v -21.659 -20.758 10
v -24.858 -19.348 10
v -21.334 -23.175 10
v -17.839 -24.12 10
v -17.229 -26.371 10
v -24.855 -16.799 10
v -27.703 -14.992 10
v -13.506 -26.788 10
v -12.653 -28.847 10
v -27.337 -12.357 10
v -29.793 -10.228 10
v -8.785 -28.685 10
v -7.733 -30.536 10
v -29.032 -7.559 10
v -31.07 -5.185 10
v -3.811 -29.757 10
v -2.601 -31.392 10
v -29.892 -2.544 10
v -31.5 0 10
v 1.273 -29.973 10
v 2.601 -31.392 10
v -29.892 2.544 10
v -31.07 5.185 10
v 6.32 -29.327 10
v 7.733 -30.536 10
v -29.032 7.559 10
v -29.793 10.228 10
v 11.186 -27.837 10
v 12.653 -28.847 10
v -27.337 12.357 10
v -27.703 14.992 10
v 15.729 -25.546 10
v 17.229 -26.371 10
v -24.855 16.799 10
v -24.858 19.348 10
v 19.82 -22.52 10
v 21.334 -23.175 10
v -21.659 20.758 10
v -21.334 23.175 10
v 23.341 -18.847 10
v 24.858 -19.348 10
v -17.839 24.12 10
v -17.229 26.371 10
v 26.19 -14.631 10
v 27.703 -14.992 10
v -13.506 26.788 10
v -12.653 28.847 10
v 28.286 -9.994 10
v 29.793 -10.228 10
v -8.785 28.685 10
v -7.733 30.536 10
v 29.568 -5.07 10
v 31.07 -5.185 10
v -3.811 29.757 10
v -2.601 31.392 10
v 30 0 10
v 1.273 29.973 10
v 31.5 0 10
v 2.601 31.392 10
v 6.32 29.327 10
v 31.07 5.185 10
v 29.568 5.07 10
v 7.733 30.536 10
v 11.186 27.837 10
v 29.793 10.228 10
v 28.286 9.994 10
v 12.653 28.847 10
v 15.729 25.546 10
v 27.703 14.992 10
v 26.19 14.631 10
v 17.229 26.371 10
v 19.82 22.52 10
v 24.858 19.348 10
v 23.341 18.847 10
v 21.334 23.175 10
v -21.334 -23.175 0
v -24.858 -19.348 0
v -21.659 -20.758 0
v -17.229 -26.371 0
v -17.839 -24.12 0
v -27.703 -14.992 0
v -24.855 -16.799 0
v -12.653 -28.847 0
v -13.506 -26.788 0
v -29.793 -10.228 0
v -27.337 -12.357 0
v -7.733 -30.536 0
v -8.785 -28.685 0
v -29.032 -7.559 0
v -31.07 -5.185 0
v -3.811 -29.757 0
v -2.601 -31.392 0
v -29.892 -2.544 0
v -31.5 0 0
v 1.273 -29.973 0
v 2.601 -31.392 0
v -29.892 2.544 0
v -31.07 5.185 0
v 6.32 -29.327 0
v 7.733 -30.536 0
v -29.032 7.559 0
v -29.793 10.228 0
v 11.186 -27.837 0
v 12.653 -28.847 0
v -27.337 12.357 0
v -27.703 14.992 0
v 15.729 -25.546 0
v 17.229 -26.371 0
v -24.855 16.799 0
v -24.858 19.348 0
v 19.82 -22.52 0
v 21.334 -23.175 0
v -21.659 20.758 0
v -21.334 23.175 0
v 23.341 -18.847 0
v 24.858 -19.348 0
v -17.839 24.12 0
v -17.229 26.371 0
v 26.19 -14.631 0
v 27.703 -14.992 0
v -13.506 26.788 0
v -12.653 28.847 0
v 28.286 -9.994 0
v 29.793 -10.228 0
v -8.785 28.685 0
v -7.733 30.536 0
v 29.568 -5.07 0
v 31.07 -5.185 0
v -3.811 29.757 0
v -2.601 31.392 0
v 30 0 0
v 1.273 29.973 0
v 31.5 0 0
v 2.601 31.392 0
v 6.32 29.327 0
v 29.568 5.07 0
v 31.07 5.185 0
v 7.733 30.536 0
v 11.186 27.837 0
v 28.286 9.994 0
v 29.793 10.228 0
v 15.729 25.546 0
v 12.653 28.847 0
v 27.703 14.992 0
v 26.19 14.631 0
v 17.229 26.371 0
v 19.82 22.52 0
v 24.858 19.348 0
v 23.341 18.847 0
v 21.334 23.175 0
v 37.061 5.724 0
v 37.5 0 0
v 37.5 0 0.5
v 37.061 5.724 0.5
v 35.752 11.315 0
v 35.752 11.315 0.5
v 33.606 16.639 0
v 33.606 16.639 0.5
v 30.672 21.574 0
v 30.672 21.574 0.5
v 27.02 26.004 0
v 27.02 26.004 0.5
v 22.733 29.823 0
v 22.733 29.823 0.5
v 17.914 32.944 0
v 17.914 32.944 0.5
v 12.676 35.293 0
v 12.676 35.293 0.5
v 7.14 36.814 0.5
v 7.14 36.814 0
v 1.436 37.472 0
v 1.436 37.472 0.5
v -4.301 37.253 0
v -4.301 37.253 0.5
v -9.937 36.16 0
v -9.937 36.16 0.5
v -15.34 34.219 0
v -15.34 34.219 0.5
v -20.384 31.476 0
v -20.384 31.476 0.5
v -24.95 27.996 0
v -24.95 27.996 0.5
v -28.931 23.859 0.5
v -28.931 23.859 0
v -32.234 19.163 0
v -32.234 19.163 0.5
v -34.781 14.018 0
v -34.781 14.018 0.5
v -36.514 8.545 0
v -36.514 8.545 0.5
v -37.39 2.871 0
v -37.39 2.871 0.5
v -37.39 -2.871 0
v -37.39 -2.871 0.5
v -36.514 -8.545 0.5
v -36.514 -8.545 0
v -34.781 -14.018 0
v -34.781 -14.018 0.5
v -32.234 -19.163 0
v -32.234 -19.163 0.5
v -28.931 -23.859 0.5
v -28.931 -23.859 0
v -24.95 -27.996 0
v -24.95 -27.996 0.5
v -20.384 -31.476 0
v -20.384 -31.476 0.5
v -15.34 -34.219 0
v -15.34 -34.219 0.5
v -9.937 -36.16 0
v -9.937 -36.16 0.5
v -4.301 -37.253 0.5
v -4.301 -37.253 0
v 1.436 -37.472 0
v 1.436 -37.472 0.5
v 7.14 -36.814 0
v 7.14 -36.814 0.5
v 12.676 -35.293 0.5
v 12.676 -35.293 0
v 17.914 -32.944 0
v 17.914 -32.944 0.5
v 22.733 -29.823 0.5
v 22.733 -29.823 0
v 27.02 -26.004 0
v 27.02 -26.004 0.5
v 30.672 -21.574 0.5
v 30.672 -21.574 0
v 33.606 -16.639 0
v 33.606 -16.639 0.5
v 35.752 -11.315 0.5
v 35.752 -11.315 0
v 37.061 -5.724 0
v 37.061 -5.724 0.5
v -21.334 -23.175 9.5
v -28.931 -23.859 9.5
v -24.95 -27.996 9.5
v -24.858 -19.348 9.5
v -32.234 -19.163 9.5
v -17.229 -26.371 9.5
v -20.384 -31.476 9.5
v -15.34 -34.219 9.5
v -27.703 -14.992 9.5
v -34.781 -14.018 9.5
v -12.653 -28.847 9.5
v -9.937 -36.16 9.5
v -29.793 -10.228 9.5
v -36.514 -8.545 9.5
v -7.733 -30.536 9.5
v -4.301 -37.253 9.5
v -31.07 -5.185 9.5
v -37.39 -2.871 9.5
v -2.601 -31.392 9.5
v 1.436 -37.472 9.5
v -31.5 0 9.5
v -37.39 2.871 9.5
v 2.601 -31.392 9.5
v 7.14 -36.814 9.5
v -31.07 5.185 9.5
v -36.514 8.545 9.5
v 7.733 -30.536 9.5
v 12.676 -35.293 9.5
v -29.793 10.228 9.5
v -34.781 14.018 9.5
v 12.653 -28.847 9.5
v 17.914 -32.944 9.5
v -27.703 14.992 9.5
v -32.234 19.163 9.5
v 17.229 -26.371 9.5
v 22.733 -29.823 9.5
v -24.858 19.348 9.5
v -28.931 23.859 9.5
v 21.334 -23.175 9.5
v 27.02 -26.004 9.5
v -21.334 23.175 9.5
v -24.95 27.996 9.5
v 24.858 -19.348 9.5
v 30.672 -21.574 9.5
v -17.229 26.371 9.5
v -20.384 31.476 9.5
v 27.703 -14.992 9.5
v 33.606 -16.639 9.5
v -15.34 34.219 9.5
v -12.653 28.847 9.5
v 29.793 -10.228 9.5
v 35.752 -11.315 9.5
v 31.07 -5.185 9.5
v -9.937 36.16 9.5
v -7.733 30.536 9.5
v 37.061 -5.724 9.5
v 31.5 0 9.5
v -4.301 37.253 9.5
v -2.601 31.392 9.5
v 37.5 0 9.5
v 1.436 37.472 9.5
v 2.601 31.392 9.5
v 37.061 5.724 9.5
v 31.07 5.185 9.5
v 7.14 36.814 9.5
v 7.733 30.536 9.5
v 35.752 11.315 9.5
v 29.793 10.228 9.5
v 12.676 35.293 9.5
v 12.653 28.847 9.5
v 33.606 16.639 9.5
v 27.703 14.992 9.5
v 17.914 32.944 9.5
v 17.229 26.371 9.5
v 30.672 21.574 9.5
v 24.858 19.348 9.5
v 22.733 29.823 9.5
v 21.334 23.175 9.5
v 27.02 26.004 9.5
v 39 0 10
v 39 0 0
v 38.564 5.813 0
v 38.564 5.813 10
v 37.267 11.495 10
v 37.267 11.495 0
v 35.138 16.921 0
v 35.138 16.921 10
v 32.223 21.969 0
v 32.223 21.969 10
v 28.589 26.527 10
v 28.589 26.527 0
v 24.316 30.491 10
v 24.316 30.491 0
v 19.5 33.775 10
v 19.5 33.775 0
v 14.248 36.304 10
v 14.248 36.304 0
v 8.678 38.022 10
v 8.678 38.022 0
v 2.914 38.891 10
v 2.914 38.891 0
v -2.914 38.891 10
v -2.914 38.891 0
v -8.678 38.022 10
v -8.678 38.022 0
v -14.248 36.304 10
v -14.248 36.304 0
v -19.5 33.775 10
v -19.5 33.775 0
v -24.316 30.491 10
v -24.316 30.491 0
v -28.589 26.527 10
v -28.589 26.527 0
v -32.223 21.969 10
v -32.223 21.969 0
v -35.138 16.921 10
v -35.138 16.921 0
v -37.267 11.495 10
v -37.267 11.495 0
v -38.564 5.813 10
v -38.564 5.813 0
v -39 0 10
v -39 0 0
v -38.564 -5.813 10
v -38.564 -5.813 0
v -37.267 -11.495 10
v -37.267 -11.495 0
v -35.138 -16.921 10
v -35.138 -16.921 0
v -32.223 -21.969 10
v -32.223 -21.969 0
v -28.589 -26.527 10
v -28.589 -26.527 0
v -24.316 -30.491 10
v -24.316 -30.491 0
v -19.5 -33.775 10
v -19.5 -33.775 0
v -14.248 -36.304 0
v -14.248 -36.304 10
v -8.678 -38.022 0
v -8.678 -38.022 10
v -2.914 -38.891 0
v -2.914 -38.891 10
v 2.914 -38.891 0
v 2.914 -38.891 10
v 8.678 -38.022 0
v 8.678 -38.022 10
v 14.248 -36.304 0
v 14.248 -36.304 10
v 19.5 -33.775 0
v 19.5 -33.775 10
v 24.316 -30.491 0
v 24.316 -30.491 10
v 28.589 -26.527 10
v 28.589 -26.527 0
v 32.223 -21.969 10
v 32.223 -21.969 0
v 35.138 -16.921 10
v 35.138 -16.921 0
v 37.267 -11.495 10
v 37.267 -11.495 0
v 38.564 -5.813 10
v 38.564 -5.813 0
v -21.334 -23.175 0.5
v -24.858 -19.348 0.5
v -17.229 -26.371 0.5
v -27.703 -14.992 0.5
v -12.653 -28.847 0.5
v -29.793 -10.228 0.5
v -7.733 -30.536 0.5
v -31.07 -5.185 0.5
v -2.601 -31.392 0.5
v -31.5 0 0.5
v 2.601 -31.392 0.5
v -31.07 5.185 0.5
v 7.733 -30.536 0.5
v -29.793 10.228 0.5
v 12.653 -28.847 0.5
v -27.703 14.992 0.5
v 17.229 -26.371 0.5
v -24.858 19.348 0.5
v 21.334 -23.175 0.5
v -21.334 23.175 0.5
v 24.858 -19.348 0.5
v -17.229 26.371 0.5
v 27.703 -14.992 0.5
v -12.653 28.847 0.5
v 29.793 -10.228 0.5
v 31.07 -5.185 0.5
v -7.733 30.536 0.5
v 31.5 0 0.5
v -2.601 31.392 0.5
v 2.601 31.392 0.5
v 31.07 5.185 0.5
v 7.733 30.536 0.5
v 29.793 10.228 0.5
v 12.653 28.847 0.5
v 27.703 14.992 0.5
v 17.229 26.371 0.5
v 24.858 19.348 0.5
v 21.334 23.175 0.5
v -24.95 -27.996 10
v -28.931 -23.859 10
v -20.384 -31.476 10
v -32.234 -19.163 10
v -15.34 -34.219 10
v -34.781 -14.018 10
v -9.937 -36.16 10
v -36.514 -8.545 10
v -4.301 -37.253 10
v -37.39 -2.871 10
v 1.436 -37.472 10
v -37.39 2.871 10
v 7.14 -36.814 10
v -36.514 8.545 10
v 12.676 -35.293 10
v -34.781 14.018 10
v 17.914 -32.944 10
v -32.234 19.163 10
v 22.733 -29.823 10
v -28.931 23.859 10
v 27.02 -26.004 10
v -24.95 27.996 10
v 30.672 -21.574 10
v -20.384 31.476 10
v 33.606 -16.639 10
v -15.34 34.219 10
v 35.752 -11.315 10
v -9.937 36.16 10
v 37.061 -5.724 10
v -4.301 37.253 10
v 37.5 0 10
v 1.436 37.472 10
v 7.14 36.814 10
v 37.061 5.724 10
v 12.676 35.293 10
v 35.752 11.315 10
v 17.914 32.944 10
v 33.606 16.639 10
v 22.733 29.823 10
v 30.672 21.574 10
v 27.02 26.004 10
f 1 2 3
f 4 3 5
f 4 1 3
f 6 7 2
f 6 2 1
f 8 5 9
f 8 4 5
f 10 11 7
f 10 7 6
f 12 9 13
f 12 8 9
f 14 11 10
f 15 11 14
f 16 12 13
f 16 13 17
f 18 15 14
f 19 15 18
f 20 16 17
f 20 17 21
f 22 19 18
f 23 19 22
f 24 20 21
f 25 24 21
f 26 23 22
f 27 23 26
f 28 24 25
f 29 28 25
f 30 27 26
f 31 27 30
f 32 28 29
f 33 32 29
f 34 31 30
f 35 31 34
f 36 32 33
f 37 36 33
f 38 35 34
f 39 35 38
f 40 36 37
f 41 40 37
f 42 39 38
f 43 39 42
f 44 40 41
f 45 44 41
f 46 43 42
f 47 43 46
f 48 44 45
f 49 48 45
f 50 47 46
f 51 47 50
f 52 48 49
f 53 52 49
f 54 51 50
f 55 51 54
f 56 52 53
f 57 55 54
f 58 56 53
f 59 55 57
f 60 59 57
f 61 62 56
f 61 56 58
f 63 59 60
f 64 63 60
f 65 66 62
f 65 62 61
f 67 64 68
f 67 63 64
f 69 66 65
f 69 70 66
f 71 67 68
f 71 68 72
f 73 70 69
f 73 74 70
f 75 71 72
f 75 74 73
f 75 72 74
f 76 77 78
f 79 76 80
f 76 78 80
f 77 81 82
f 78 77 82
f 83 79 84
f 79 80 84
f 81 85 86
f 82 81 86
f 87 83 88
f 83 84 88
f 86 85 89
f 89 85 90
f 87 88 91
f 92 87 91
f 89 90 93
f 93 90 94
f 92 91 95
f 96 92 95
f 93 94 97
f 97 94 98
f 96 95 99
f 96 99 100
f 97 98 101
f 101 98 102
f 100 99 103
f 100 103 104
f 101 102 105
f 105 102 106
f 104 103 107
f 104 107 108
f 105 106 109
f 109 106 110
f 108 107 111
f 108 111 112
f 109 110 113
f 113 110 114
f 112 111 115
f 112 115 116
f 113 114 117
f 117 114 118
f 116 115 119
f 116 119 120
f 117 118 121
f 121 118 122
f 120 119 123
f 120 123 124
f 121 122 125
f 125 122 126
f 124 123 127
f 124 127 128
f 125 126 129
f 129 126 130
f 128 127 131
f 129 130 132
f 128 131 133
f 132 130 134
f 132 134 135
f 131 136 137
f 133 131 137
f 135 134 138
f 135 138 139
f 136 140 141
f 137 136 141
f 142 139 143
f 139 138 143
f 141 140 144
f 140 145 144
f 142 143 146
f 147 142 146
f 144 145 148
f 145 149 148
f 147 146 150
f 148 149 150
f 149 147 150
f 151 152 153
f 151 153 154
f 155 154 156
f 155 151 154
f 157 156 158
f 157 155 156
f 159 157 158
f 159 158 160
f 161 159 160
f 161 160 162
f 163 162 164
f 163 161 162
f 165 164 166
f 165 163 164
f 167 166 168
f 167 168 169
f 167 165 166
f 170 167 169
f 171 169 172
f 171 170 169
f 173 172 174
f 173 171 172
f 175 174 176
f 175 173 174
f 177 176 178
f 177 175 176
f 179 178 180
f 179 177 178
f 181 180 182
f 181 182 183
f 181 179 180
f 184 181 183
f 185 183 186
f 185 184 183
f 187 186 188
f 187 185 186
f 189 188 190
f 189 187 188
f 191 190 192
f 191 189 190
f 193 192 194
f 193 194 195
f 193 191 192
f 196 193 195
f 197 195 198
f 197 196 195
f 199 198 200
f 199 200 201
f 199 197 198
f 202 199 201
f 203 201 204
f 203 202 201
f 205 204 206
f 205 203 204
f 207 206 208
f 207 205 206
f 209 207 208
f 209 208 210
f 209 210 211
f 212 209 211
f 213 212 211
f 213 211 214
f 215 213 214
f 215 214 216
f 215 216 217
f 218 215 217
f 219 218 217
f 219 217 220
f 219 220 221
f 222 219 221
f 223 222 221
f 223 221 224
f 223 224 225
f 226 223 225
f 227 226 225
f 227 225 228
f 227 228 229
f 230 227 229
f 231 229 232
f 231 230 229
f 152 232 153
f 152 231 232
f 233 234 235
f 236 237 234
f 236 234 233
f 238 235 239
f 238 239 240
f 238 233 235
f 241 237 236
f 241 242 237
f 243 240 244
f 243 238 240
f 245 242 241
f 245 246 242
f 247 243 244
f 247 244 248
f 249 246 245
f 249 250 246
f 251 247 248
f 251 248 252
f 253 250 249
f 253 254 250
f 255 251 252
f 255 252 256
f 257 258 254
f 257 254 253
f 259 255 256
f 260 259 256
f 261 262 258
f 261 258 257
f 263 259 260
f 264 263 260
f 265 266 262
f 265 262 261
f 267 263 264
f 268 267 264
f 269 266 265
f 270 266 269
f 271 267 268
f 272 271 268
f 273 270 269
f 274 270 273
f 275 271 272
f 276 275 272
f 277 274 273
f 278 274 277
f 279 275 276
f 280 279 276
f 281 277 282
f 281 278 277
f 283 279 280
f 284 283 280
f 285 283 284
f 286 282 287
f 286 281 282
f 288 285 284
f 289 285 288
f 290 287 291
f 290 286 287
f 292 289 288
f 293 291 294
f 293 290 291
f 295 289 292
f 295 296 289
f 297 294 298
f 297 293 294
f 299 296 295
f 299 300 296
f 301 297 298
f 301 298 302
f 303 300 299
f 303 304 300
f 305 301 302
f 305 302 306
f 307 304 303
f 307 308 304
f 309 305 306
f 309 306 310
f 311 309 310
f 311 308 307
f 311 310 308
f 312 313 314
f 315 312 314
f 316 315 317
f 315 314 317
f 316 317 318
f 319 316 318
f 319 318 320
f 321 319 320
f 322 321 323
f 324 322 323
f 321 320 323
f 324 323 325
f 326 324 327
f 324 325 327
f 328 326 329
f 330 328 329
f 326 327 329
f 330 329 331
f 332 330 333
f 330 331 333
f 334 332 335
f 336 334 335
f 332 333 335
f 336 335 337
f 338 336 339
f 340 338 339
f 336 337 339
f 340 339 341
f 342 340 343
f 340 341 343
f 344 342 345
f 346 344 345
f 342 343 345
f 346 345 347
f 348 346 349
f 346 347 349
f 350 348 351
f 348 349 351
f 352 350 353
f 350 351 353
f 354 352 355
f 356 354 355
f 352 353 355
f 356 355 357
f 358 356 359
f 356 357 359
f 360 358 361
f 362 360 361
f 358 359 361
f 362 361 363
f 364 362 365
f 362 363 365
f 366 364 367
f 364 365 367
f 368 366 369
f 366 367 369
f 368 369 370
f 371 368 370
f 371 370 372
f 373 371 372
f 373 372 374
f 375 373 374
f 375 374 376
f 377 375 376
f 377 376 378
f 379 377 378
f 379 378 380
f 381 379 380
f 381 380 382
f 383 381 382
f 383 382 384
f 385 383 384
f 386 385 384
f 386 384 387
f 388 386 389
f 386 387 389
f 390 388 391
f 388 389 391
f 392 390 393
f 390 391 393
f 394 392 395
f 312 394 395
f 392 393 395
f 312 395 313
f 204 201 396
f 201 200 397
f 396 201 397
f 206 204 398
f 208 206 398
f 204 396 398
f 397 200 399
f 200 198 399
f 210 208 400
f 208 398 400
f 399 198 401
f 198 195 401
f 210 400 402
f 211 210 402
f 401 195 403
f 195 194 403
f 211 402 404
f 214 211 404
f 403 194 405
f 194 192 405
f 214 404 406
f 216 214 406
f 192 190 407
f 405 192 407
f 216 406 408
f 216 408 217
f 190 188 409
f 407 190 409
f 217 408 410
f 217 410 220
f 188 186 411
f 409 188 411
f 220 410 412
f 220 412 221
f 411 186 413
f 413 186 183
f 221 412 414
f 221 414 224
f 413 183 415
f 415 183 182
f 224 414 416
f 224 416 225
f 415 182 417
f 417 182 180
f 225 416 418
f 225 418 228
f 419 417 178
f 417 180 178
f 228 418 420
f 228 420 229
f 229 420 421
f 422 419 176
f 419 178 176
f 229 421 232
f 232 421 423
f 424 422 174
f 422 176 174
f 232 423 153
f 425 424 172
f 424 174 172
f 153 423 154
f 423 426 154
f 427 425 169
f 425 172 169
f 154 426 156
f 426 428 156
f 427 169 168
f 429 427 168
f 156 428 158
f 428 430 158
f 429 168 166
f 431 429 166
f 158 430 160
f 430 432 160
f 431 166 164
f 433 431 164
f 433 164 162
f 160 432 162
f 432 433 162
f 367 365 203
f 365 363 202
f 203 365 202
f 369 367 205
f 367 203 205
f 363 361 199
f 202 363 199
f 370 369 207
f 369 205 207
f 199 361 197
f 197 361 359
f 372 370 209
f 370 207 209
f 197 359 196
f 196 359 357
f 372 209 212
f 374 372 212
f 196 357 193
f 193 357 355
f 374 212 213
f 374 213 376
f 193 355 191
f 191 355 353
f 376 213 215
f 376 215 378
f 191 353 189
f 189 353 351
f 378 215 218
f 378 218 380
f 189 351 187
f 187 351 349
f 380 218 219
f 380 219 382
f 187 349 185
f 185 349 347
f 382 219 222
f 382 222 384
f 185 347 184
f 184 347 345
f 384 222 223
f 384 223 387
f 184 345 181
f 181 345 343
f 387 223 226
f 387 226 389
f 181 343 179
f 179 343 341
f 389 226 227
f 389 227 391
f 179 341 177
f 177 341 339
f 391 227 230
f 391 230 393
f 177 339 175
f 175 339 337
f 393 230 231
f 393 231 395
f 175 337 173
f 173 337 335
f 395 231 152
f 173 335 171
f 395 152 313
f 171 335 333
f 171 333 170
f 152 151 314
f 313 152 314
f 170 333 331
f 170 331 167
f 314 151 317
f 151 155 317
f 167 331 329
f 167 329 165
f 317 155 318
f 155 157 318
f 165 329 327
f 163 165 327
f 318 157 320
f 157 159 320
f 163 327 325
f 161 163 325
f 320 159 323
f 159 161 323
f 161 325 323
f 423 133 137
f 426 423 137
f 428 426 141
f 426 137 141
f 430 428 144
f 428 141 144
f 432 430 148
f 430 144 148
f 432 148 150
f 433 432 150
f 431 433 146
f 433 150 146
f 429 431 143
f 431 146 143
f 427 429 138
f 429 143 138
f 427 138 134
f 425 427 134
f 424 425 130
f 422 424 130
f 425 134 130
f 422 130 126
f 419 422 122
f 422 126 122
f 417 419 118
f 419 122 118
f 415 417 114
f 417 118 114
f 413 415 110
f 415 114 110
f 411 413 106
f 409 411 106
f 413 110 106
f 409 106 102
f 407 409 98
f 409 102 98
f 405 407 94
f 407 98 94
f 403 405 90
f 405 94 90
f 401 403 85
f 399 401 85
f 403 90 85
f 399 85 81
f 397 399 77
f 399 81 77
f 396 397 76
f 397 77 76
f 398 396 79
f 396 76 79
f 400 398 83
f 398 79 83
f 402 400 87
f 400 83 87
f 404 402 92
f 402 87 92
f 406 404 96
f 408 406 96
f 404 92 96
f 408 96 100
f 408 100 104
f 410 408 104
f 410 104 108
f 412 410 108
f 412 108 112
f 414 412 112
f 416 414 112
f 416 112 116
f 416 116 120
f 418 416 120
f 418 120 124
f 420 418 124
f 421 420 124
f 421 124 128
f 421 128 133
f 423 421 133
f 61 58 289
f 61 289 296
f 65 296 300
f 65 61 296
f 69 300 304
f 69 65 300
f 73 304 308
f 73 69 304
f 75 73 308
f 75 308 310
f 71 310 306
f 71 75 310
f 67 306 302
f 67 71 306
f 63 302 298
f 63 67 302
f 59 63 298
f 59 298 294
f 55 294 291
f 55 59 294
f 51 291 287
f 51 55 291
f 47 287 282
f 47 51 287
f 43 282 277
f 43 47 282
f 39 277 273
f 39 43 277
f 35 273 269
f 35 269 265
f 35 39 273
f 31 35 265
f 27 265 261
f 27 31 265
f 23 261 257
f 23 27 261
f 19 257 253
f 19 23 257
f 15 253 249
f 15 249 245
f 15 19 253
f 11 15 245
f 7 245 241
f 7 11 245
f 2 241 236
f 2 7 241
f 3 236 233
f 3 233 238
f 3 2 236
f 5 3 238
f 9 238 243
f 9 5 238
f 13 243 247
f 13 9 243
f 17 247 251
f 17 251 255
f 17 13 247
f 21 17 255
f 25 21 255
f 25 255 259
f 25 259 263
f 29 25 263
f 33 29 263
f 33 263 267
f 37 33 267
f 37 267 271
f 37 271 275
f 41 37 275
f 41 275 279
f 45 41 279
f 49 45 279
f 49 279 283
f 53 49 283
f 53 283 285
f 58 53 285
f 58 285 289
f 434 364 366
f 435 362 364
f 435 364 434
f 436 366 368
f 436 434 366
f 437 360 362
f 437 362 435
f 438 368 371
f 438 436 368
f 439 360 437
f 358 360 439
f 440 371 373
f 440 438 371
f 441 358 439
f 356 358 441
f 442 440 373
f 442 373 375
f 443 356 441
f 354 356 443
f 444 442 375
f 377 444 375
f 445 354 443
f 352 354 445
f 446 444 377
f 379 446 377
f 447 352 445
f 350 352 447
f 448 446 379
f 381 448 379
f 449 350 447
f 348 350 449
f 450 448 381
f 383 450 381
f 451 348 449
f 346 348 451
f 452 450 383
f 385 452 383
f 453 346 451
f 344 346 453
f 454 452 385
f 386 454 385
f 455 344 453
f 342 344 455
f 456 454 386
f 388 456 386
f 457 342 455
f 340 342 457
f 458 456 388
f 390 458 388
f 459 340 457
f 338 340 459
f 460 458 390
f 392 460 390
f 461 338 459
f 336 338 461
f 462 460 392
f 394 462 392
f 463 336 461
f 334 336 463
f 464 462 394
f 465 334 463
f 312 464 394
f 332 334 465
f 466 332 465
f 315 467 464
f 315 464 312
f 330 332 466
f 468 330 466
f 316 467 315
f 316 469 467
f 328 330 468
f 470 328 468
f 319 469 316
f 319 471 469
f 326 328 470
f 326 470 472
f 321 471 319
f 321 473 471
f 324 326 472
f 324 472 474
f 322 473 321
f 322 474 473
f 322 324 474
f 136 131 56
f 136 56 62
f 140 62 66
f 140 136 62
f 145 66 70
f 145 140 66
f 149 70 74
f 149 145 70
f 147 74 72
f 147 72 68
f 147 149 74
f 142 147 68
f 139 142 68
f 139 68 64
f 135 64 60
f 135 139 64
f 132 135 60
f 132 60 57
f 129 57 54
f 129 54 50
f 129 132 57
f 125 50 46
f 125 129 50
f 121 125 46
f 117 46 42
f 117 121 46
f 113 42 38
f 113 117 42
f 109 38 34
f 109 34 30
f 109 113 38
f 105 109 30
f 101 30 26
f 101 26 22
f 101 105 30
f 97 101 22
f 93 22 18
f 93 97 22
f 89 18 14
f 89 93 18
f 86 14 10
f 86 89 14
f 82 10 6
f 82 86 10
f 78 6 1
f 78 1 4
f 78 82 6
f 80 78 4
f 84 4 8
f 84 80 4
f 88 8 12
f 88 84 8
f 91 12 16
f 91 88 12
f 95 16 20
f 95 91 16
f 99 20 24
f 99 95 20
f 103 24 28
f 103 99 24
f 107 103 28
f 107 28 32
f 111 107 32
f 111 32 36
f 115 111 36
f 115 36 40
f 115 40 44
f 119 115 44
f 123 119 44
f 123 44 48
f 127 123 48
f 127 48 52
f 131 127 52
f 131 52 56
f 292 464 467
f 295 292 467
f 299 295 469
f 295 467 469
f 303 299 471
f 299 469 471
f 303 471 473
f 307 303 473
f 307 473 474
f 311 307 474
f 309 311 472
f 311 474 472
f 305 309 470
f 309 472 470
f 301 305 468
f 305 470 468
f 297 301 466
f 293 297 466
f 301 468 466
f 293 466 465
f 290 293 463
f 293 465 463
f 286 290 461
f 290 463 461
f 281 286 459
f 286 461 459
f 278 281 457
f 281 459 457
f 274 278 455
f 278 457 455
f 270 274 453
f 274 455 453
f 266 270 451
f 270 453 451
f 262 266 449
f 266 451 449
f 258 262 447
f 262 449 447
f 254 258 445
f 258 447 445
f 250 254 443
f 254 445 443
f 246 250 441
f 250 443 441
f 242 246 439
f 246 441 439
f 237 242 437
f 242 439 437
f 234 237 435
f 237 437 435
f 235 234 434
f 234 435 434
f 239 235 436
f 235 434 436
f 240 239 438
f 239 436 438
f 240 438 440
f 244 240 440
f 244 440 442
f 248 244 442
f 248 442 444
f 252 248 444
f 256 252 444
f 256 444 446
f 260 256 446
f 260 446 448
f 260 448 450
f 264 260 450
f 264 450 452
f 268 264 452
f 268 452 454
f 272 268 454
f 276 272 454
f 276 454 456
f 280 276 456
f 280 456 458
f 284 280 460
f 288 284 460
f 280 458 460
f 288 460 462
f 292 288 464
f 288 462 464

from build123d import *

# Parameters (mm, degrees)
SKETCH_R        = 39
SKETCH_R_2      = 30
PAD006_DEPTH    = 10
SKETCH008_R     = 37.5
SKETCH008_R_2   = 31.5
POCKET002_DEPTH = 0.5
SKETCH009_R     = 37.5
SKETCH009_R_2   = 31.5
POCKET003_DEPTH = 0.5


with BuildPart() as part:
    # Sketch → Pad006 (new body)
    with BuildSketch(Plane.XY):
        Circle(SKETCH_R)
        Circle(SKETCH_R_2, mode=Mode.SUBTRACT)
    extrude(amount=PAD006_DEPTH)

    # Sketch008 → Pocket002 (cut)
    with BuildSketch(Plane.XY.offset(10)):
        Circle(SKETCH008_R)
        Circle(SKETCH008_R_2, mode=Mode.SUBTRACT)
    extrude(amount=-POCKET002_DEPTH, mode=Mode.SUBTRACT)

    # Sketch009 → Pocket003 (cut)
    with BuildSketch(Plane.XY):
        Circle(SKETCH009_R)
        Circle(SKETCH009_R_2, mode=Mode.SUBTRACT)
    extrude(amount=POCKET003_DEPTH, mode=Mode.SUBTRACT)


solid = part.part
